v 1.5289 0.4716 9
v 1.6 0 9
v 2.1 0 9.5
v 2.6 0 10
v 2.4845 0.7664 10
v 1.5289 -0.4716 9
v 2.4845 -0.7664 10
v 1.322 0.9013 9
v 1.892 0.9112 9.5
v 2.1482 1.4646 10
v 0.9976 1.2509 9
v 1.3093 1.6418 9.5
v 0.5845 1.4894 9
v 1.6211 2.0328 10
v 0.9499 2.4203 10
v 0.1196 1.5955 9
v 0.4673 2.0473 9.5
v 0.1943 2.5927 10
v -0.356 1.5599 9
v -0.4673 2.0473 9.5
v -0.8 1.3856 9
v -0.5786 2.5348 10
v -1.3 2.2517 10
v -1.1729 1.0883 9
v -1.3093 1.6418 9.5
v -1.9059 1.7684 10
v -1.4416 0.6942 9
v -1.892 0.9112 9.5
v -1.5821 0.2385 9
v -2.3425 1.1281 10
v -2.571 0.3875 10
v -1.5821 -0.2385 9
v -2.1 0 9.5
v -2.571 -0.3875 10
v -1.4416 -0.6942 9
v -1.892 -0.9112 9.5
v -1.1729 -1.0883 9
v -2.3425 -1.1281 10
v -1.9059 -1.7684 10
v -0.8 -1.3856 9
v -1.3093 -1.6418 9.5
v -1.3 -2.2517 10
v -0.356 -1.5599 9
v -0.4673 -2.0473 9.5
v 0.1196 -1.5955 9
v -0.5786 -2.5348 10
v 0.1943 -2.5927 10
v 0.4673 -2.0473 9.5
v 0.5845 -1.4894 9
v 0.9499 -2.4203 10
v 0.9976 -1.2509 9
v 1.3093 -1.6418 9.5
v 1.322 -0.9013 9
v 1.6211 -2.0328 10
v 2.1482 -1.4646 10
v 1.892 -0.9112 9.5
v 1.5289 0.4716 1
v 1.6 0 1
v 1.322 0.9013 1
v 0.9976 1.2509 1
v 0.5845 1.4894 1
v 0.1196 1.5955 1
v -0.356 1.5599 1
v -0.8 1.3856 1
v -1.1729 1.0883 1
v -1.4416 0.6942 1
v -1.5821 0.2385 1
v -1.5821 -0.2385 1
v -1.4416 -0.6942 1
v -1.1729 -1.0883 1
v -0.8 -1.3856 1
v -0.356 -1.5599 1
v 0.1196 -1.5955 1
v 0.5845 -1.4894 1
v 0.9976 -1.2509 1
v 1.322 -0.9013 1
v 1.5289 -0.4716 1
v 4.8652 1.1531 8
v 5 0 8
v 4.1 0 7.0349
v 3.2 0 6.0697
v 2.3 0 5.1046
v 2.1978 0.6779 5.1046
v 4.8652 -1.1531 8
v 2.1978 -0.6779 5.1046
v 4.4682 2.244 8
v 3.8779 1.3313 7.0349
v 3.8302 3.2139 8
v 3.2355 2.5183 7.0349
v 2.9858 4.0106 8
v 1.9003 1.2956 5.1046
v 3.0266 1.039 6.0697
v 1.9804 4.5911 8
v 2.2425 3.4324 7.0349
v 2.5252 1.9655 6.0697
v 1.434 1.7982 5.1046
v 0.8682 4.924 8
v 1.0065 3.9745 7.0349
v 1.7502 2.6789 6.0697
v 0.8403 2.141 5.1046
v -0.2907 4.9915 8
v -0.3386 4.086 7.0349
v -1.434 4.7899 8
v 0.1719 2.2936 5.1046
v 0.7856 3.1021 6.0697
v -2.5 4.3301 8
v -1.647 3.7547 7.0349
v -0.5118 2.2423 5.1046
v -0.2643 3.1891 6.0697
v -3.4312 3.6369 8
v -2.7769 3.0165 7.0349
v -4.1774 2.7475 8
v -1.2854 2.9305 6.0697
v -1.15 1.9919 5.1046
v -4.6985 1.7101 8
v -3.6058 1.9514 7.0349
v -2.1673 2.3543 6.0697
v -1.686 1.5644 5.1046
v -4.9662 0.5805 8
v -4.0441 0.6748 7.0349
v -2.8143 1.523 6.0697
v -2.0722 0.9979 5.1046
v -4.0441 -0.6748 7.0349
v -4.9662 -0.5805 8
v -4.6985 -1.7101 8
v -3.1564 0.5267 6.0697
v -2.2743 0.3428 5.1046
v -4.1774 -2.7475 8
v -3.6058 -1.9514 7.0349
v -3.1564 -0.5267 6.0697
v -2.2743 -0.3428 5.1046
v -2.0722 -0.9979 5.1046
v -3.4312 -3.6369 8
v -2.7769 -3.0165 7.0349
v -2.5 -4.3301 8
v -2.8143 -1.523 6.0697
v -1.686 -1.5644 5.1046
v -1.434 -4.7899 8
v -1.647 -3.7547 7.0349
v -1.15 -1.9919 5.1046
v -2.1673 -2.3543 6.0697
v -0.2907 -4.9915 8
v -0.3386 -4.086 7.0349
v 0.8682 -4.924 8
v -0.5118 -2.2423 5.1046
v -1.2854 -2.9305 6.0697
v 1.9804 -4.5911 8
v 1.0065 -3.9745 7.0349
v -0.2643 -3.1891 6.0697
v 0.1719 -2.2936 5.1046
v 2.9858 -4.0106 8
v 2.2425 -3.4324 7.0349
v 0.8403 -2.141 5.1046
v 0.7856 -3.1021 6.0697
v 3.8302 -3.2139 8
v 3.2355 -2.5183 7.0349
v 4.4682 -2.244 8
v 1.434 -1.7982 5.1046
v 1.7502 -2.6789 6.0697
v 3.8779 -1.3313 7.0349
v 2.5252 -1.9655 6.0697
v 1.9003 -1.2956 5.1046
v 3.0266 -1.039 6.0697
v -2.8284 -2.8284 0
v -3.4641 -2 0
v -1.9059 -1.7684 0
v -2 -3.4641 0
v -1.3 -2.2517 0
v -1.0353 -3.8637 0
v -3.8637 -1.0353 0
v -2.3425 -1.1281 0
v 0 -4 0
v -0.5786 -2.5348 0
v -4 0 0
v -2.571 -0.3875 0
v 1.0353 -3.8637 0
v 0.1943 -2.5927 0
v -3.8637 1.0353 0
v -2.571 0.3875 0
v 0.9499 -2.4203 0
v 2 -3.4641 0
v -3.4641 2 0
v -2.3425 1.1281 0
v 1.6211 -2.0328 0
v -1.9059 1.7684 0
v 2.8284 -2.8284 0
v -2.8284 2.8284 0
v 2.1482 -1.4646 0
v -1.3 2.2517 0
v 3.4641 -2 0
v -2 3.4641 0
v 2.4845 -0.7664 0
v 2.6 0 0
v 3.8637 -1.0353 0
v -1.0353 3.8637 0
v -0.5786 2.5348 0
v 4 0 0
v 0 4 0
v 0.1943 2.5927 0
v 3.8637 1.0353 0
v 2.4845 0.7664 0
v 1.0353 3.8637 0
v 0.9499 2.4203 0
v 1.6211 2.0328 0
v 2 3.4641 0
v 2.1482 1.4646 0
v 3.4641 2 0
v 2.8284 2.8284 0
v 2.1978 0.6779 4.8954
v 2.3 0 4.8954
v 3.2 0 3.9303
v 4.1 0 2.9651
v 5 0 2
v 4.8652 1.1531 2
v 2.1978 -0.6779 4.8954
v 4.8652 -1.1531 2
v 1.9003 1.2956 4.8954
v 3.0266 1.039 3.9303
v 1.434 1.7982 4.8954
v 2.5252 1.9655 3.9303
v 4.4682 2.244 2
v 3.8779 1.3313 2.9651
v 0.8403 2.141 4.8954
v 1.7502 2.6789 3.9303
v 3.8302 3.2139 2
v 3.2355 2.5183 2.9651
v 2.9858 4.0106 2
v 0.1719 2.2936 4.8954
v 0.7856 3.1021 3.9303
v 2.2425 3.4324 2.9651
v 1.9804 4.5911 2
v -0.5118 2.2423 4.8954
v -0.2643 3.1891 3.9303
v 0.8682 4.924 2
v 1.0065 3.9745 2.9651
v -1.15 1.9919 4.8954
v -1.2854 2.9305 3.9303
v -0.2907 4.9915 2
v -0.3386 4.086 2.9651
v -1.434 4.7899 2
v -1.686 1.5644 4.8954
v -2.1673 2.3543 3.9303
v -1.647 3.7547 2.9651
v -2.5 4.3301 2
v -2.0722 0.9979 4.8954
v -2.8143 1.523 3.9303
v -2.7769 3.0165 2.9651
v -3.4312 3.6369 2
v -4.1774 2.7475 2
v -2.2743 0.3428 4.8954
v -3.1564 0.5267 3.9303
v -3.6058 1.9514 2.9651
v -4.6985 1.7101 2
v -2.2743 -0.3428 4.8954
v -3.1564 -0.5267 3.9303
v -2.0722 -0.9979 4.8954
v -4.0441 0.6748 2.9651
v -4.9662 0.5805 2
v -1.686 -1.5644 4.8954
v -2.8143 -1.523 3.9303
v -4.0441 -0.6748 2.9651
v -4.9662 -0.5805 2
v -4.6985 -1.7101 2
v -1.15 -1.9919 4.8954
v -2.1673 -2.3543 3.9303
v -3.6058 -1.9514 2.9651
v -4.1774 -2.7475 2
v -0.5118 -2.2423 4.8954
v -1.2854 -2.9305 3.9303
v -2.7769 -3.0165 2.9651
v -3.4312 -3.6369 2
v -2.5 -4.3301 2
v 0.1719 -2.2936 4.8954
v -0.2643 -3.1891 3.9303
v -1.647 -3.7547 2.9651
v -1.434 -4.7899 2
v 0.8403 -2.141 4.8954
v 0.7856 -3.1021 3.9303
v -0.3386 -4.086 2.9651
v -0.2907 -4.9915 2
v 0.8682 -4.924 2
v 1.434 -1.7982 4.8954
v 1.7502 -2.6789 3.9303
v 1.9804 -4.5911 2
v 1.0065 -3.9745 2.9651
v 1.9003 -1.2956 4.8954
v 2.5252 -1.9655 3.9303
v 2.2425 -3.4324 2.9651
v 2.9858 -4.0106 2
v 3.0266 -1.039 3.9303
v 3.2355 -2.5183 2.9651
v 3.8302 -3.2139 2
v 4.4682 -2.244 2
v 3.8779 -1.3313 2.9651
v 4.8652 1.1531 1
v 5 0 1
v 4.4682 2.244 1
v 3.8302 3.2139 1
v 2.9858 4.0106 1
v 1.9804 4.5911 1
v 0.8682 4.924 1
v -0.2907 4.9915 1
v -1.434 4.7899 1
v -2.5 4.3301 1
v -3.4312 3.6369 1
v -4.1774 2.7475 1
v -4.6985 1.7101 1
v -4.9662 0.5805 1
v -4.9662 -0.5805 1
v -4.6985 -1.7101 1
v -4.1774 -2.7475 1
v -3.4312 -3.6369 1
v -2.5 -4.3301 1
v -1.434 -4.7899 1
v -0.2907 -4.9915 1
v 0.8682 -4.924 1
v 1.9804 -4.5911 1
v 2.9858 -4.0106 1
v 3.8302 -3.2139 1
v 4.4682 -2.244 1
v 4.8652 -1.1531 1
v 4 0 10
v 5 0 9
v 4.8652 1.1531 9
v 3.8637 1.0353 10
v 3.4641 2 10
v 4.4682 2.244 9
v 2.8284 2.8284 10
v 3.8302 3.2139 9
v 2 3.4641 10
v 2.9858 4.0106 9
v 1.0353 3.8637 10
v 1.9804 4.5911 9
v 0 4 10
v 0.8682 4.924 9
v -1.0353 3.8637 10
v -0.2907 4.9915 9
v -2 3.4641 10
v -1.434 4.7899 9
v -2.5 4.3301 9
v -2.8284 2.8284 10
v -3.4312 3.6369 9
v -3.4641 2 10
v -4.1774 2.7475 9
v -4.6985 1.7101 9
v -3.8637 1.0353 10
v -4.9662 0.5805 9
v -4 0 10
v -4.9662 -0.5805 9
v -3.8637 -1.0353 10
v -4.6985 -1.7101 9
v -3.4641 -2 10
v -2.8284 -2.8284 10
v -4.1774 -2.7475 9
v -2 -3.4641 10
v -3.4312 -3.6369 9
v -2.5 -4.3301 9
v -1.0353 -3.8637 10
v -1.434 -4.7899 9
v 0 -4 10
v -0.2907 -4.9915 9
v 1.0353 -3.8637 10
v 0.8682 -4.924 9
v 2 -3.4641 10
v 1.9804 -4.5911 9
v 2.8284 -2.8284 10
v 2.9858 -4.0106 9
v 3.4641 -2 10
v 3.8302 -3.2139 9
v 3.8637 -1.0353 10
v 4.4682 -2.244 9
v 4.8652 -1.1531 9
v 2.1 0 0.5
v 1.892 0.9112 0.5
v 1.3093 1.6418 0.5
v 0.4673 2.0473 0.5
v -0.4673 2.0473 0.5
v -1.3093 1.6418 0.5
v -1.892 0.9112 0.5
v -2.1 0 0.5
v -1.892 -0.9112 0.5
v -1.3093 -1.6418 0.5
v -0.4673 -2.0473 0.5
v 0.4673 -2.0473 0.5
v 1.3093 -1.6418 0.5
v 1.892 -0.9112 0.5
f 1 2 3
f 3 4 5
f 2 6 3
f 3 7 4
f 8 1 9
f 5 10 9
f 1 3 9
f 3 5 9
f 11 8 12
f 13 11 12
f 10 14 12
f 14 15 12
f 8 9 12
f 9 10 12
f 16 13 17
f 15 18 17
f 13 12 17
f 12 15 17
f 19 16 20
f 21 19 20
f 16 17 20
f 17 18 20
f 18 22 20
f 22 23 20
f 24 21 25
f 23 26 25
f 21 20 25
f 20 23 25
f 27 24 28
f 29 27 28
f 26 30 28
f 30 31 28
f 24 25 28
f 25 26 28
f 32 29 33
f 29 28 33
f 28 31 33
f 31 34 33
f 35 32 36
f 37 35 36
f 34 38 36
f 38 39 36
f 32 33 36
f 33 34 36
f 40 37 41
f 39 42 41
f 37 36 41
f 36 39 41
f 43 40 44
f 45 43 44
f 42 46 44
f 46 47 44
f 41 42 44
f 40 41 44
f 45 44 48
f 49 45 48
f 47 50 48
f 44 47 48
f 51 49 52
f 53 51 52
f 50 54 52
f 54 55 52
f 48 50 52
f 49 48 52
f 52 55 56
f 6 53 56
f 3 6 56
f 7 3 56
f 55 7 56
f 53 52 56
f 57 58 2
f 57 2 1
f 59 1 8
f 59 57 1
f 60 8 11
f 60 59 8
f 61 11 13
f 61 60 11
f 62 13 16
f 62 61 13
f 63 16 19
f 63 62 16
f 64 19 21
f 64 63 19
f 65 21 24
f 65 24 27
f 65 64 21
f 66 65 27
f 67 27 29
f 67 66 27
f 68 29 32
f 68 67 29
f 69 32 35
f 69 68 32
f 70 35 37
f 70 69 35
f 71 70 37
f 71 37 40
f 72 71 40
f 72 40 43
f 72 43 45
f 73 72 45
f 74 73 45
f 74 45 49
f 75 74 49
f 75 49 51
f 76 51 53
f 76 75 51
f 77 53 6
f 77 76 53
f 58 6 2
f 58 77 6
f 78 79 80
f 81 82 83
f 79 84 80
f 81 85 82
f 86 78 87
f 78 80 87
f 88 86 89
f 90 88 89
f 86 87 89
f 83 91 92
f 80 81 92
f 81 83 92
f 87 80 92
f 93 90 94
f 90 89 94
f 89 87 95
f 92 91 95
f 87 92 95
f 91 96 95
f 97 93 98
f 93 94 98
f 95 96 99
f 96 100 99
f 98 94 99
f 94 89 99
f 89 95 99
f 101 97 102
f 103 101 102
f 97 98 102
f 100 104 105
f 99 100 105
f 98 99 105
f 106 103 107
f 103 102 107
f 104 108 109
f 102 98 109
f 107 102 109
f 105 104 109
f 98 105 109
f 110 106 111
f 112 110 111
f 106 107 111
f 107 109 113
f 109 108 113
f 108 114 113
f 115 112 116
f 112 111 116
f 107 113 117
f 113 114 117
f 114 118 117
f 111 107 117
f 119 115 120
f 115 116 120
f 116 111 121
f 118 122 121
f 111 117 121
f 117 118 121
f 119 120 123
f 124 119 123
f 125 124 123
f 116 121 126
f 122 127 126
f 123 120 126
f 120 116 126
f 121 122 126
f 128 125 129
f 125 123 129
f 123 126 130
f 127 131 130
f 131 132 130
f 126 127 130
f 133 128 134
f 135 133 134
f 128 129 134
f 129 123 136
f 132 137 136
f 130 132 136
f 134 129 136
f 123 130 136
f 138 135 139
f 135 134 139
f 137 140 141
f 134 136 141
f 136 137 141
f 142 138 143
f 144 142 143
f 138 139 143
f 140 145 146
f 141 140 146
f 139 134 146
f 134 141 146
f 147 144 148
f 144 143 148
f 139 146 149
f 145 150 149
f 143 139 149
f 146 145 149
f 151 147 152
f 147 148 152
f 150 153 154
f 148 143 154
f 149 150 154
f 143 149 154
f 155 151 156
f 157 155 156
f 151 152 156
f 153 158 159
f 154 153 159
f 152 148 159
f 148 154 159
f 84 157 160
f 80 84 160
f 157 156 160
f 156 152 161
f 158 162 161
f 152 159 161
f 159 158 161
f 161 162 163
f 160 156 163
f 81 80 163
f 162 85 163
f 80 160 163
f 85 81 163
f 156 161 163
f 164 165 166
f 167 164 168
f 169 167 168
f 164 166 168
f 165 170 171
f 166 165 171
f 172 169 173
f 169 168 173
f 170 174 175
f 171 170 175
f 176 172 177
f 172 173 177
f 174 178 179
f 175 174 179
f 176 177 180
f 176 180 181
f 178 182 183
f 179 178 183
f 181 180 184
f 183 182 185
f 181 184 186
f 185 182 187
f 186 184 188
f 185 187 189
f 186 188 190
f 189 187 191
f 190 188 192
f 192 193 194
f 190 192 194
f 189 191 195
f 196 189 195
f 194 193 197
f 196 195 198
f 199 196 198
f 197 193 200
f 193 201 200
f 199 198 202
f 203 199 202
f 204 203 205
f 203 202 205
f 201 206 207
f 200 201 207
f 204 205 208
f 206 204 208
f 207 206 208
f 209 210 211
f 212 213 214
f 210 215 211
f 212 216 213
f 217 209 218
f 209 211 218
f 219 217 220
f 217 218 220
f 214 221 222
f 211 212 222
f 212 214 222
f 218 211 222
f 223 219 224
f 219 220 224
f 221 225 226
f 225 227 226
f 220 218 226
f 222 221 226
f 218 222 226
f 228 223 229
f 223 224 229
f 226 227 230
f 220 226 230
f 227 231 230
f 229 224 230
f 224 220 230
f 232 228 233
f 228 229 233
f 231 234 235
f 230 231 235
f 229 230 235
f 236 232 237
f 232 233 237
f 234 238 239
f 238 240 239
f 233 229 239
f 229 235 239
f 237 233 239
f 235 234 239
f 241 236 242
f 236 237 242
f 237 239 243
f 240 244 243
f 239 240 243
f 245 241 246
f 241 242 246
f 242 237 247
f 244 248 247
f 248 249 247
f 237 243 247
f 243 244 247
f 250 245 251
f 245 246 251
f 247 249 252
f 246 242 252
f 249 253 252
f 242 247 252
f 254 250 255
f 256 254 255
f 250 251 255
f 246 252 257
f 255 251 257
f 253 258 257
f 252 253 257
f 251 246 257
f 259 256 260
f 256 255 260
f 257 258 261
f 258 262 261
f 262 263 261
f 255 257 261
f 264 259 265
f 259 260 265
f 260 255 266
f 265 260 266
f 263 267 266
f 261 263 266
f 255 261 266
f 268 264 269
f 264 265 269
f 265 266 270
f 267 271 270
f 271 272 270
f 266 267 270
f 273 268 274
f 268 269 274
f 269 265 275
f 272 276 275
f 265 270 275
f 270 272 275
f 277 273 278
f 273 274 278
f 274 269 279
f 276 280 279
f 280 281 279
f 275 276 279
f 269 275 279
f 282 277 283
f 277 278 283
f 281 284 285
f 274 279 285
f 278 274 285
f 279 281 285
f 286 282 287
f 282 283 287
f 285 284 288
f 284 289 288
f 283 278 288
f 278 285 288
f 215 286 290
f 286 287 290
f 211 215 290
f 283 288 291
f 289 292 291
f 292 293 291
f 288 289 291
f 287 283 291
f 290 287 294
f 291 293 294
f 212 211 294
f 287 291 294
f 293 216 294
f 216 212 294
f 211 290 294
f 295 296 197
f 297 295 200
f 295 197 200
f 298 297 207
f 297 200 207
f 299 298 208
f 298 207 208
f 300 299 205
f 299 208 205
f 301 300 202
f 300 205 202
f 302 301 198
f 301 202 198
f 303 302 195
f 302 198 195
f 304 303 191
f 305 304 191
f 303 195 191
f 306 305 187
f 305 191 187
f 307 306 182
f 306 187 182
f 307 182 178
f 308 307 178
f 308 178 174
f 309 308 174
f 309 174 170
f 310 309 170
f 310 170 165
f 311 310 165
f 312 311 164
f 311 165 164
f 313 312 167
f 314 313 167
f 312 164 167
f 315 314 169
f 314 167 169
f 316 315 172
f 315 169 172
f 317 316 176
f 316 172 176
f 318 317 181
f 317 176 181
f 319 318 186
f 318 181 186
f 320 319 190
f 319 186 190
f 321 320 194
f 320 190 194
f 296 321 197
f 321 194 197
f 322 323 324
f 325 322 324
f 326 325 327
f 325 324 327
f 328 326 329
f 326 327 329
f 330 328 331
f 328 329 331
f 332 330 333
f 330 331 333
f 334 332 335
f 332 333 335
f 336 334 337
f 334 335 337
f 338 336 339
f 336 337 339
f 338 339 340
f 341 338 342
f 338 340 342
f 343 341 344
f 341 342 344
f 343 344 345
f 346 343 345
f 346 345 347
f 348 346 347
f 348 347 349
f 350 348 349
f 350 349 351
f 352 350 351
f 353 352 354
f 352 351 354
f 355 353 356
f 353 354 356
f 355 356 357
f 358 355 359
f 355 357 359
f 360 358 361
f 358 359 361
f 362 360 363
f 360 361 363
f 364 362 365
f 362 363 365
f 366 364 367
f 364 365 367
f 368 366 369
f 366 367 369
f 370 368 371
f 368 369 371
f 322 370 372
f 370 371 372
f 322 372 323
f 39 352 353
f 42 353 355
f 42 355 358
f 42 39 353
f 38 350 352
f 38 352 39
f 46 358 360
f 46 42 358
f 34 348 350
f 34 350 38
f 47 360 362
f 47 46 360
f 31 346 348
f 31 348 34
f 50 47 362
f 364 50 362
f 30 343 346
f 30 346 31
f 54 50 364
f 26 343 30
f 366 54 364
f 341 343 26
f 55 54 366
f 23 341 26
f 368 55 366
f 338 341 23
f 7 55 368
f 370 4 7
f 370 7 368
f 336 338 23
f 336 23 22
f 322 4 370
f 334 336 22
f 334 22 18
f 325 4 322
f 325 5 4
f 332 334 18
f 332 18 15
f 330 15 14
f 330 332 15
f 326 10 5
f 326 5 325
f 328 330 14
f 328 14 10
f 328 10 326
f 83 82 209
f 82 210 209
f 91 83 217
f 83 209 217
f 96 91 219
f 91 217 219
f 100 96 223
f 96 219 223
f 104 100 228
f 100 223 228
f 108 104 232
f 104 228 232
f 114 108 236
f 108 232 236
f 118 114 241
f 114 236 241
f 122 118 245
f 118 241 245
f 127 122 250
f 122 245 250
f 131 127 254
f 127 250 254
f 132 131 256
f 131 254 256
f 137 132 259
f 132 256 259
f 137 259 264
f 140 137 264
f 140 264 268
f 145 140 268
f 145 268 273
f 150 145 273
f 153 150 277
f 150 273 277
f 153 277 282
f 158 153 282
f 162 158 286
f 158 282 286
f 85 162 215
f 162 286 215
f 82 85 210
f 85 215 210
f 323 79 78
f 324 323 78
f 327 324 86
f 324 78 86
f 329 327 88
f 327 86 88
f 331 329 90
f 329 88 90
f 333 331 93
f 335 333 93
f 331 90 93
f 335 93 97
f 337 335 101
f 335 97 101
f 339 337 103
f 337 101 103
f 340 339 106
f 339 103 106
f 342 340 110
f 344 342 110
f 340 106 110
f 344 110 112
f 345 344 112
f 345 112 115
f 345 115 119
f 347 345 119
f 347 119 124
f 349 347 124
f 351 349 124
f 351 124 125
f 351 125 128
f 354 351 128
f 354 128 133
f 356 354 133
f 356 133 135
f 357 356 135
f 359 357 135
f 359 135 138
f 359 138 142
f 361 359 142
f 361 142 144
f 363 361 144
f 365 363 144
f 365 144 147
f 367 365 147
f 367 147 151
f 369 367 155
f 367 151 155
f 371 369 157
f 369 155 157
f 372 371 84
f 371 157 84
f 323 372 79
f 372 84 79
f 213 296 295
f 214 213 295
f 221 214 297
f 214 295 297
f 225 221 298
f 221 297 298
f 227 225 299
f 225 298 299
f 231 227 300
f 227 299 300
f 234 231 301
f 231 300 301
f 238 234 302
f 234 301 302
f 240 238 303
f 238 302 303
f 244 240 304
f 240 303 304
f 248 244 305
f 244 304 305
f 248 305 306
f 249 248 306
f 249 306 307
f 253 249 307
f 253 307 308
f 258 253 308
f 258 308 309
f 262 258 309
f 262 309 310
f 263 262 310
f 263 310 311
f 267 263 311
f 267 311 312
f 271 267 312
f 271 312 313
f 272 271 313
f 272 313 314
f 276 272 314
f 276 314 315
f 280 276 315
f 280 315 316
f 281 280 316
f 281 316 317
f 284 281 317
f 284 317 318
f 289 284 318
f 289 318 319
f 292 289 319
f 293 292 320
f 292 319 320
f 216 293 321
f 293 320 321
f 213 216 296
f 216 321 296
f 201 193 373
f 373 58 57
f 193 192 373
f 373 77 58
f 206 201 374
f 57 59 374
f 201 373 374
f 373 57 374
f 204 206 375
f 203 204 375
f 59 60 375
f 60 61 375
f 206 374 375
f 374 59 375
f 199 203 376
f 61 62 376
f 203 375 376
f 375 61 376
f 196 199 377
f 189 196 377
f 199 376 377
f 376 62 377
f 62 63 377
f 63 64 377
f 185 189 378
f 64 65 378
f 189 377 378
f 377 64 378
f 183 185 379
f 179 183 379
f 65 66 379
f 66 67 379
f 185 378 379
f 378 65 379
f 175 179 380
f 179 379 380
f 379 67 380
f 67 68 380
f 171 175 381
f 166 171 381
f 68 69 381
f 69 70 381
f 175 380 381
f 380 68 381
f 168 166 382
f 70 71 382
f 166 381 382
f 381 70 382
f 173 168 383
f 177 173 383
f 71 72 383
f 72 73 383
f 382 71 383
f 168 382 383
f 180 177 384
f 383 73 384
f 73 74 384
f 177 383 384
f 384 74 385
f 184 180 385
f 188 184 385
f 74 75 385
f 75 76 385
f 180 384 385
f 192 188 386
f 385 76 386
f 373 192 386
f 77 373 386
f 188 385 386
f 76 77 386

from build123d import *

# Parameters (mm, degrees)
F0_R     = 5
F0_R_2   = 1.6
F1_DEPTH = 10
F4_SIZE  = 1


with BuildPart() as f1:
    # F0 (on Top) → F1 (new body)
    with BuildSketch(Plane.XY):
        Circle(F0_R)
        Circle(F0_R_2, mode=Mode.SUBTRACT)
    extrude(amount=F1_DEPTH)

    # F2 (on Front) → F3 (revolve, cut)
    with BuildSketch(Plane.XZ):
        Polygon((5, 2), (5, 8), (2.3, 5.104604), (2.3, 4.895396), align=None)
    revolve(axis=Axis((0, 0, 10), (0, 0, 1)), mode=Mode.SUBTRACT)

    # F4
    f4_edges = [f1.edges().sort_by_distance(p)[0] for p in [
        (-5, 0, 10),
        (-5, 0, 0),
        (-1.6, 0, 10),
        (-1.6, 0, 0),
    ]]
    chamfer(f4_edges, length=F4_SIZE)


solid = f1.part
